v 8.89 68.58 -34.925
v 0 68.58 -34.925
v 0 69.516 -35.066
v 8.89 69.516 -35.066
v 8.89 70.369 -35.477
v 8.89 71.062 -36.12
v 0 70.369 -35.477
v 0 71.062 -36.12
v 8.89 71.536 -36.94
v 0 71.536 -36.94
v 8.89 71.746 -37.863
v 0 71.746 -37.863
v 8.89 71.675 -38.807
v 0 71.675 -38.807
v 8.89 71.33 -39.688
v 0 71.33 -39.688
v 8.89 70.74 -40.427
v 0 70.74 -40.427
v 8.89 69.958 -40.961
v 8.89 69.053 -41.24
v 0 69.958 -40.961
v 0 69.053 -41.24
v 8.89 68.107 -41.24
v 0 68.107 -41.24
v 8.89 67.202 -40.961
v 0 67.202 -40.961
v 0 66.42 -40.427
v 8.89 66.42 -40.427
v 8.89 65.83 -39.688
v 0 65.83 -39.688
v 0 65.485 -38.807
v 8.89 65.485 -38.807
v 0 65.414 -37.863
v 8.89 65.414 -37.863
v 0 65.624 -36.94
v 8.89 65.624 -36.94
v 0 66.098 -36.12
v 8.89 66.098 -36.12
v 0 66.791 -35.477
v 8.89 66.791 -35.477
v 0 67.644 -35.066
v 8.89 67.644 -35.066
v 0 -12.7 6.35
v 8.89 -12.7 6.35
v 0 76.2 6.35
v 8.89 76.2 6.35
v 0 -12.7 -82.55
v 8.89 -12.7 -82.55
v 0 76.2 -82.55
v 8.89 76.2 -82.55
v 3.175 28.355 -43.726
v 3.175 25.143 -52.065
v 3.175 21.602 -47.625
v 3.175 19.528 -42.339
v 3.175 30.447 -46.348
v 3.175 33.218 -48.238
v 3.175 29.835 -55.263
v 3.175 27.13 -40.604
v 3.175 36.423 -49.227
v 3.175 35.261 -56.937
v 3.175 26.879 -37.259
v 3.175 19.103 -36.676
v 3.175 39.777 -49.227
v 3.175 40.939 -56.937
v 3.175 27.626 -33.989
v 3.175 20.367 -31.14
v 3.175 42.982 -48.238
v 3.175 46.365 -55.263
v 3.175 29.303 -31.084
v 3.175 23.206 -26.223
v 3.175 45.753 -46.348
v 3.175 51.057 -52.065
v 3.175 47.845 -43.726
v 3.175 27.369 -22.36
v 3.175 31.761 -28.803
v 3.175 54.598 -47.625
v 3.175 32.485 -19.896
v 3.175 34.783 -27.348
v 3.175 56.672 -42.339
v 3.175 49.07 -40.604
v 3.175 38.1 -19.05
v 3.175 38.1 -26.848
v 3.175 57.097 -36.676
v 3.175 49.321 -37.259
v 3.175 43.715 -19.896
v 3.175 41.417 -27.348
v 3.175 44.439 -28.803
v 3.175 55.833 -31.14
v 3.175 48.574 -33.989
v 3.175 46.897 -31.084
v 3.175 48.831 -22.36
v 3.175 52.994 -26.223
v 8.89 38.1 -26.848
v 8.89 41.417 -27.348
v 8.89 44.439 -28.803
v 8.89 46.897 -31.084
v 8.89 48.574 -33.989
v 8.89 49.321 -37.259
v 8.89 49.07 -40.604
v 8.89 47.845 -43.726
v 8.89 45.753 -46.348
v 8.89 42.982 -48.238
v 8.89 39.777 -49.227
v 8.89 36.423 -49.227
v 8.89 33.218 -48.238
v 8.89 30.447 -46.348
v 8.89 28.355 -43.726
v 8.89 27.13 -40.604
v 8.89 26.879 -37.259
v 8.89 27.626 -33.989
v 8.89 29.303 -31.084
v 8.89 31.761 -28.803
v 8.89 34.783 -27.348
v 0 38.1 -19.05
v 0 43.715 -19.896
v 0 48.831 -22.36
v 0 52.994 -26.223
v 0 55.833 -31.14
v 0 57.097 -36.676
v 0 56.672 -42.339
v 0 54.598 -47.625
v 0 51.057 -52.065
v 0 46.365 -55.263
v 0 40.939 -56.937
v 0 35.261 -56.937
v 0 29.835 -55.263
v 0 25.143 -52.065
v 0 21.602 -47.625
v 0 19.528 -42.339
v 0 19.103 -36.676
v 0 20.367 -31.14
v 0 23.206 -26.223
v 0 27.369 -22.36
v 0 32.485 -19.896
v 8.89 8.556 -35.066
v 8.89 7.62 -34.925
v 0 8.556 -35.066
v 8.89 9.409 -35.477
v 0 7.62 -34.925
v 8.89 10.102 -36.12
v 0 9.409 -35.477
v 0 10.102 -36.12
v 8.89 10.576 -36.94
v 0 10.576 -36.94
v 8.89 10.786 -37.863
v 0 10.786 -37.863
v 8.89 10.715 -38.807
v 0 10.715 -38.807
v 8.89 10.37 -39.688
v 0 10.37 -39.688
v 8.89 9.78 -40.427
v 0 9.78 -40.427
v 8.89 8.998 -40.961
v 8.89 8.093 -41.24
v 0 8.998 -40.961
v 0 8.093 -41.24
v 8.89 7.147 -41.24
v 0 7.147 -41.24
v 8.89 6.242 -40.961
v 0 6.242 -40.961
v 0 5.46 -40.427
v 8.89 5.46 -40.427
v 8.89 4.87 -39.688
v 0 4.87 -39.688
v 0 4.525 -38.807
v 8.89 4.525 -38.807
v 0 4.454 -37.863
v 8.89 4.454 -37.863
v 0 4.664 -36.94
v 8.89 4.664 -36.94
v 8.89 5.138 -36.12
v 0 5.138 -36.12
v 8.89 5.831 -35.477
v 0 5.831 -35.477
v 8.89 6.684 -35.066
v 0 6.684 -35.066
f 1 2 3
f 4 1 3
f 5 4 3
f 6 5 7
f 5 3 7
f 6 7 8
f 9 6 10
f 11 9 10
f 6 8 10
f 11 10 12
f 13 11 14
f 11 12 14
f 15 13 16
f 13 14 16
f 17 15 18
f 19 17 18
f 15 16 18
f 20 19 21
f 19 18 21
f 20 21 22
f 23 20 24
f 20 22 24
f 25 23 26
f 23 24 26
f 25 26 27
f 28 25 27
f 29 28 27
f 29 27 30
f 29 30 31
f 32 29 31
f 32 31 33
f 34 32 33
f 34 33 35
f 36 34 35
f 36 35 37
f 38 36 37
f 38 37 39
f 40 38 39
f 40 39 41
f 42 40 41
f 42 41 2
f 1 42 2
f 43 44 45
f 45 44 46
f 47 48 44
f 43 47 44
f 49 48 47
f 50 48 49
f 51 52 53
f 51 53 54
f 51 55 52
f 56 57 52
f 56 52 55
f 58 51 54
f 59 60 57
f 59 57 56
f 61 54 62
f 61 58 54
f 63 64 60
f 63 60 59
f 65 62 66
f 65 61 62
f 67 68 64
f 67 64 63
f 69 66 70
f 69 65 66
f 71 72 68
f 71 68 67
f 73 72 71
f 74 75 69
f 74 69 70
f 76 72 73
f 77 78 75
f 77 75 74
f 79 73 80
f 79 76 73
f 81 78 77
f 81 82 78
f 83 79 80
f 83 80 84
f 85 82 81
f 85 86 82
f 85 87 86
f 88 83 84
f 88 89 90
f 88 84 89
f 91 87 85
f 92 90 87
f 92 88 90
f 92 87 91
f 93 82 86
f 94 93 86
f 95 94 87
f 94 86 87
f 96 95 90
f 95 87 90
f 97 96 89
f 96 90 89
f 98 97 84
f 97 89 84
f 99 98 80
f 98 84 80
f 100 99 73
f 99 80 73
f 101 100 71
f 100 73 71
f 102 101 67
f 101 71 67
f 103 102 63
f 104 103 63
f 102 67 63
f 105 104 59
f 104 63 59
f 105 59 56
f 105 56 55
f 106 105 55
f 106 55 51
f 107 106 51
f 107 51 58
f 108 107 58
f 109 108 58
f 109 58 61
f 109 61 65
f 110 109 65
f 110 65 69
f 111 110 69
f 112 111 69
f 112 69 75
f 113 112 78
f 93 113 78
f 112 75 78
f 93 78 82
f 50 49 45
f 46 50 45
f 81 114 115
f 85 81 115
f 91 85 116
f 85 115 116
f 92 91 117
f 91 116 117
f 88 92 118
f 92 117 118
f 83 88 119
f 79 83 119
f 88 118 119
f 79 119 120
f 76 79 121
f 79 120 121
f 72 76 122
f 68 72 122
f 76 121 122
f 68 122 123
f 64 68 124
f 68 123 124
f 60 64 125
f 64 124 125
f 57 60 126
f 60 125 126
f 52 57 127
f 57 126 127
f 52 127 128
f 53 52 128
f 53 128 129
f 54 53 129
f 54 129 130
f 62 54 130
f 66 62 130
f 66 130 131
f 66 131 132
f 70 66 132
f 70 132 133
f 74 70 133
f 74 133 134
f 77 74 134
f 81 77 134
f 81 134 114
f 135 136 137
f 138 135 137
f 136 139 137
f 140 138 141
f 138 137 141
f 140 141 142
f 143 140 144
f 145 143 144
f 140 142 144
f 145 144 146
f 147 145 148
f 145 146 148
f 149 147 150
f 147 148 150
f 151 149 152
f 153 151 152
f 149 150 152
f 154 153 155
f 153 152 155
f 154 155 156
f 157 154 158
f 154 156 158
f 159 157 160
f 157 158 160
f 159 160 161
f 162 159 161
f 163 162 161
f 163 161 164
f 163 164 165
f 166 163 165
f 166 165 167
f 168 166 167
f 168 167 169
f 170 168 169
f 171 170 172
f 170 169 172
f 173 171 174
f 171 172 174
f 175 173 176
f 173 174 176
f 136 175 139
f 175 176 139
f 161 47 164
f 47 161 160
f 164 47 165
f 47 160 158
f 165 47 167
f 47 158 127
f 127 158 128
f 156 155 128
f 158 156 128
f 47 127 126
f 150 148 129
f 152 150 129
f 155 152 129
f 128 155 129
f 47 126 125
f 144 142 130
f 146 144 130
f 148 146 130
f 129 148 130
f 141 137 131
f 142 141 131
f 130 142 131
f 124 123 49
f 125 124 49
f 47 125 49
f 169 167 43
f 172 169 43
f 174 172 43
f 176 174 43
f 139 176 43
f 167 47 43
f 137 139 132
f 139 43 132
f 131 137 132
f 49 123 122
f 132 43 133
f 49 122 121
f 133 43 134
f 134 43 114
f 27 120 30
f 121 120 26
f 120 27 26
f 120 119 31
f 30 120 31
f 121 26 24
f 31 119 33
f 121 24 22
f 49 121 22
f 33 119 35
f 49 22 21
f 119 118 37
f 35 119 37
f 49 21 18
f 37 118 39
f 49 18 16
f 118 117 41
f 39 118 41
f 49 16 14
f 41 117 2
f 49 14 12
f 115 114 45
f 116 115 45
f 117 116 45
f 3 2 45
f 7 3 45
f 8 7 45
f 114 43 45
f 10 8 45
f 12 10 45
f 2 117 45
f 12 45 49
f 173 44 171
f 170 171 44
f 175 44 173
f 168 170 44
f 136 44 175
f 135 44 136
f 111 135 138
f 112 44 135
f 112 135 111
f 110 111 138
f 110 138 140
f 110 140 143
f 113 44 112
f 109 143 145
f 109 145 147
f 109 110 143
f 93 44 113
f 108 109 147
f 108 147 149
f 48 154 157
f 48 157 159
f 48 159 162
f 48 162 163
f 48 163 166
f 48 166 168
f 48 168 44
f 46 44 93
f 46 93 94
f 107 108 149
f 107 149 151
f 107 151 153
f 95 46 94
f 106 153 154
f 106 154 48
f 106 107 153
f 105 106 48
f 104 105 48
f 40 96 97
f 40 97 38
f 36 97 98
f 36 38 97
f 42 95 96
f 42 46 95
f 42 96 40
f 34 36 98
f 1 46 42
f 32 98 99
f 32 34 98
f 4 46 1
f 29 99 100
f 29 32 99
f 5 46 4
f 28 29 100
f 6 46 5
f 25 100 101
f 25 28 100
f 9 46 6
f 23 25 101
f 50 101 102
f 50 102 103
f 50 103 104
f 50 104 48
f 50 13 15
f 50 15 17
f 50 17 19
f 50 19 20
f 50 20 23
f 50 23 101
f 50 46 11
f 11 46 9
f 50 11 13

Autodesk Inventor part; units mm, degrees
ref_plane "YZ Plane" through (0, 0, 0) normal (1, 0, 0) x (0, 1, 0)
ref_plane "XZ Plane" through (0, 0, 0) normal (0, 1, 0) x (-1, 0, 0)
ref_plane "XY Plane" through (0, 0, 0) normal (0, 0, 1) x (1, 0, 0)
sketch "Sketch3" plane through (0, 0, 0) normal (1, 0, 0) x (0, 1, 0)
  line L0 (0, 0) -> (76.2, 0)
  line L1 (76.2, 0) -> (76.2, -76.2)
  line L2 (76.2, -76.2) -> (0, -76.2)
  line L3 (0, -76.2) -> (0, 0)
  line L4 (76.2, 0) -> (50.8, 0)
  line L5 (50.8, 50.8) -> (76.2, 50.8)
  line L6 (76.2, 50.8) -> (76.2, 0)
  line L7 (76.2, -76.2) -> (50.8, -76.2)
  line L8 (50.8, -127) -> (76.2, -127)
  line L9 (76.2, -127) -> (76.2, -76.2)
  line L10 (50.8, 50.8) -> (-50.8, 50.8)
  line L11 (-50.8, 50.8) -> (-50.8, 0)
  line L12 (0, 0) -> (50.8, 0)
  line L13 (50.8, -76.2) -> (0, -76.2)
  line L14 (-50.8, -76.2) -> (-50.8, -127)
  line L15 (-50.8, -127) -> (50.8, -127)
  line L16 (0, 0) -> (0, -76.2)
  line L17 (-50.8, -76.2) -> (-50.8, 0)
  dimension "d1" = 76.2
  dimension "d26" = 50.8
extrude "Extrusion1" add sketch "Sketch3" along normal blind 25.4
sketch "Sketch5" plane through (0, 0, 0) normal (-1, 0, 0) x (0, 0, 1)
  line L0 (-76.2, 76.2) -> (0, 76.2) projected
  line L1 (-76.2, 76.2) -> (-38.1, 76.2)
  line L2 (-38.1, 76.2) -> (-38.1, 63.5)
  line L3 (-38.1, 63.5) -> (-38.1, 38.1)
  circle A0 centre (-38.1, 38.1) radius 11.2522
  point P0 (0, 0)
  dimension "d10" = 38.1
  dimension "d11" = 12.7
  dimension "d12" = 25.4
  dimension "d13" = 22.5044
extrude "Extrusion3" cut sketch "Sketch5" against normal blind 76.2
sketch "Sketch6" plane through (25.4, 0, 0) normal (1, 0, 0) x (0, 0, -1)
  circle A0 centre (38.1, 38.1) radius 11.2522 projected
  circle A1 centre (38.1, 38.1) radius 19.05
  point P0 (0, 0)
  dimension "d20" = 38.1
extrude "Extrusion4" cut sketch "Sketch6" against normal blind 6.35
sketch "Sketch8" plane through (0, 76.2, 50.8) normal (0, 1, 0) x (1, 0, 0)
  line L0 (0, 0) -> (25.4, 0) projected
  line L1 (12.7, 0) -> (9.525, 0)
  line L2 (9.525, 0) -> (15.875, 0)
  line L3 (15.875, 0) -> (15.875, 50.8)
  line L4 (15.875, 50.8) -> (9.525, 50.8)
  line L5 (9.525, 50.8) -> (9.525, 0)
  line L6 (0, 177.8) -> (0, 0) projected
  line L7 (12.7, 177.8) -> (9.525, 177.8)
  line L8 (9.525, 177.8) -> (15.875, 177.8)
  line L9 (15.875, 177.8) -> (15.875, 127)
  line L10 (15.875, 127) -> (9.525, 127)
  line L11 (9.525, 127) -> (9.525, 177.8)
  line L12 (0, 0) -> (0, 177.8)
  point P0 (0, 50.8)
  point P1 (25.4, 177.8)
  point P2 (15.875, 0)
  dimension "d28" = 6.35
  dimension "d29" = 50.8
extrude "Extrusion5" cut sketch "Sketch8" against normal blind 76.2
sketch "Sketch9" plane through (0, -50.8, 50.8) normal (0, 0, 1) x (1, 0, 0)
  line L0 (9.525, 50.8) -> (15.875, 50.8)
  line L1 (15.875, 50.8) -> (15.875, 0)
  line L2 (15.875, 0) -> (9.525, 0)
  line L3 (9.525, 0) -> (9.525, 50.8)
  point P0 (0, 50.8)
  dimension "d32" = 6.35
  dimension "d33" = 50.8
extrude "Extrusion6" cut sketch "Sketch9" against normal blind 203.2
sketch "Sketch10" plane through (0, 0, 0) normal (-1, 0, 0) x (0, 0, 1)
  circle A0 centre (-38.1, 38.1) radius 11.2522 projected
  circle A1 centre (-38.1, 38.1) radius 19.05
  point P0 (0, 0)
  dimension "d36" = 38.1
extrude "Extrusion7" cut sketch "Sketch10" against normal blind 3.175 contours A0 | A1
sketch "Sketch11" plane through (0, 76.2, 50.8) normal (0, 1, 0) x (1, 0, 0)
  line L0 (9.525, 50.8) -> (15.875, 50.8) projected
  line L1 (16.51, 50.8) -> (16.51, 0)
  line L2 (16.51, 0) -> (8.89, 0)
  line L3 (9.525, 177.8) -> (9.525, 0) projected
  line L4 (8.89, 0) -> (8.89, 51.308)
  line L5 (8.89, 0) -> (60.198, 0) construction
  line L6 (8.89, 51.308) -> (16.51, 51.308)
  line L7 (16.51, 51.308) -> (16.51, 50.8)
  line L8 (0, 69.85) -> (0, 107.95) projected
  line L9 (0, 88.9) -> (23.8125, 88.9)
  line L10 (9.525, 127) -> (15.875, 127)
  line L11 (16.51, 127) -> (16.51, 177.8)
  line L12 (16.51, 177.8) -> (8.89, 177.8)
  line L13 (8.89, 177.8) -> (8.89, 126.492)
  line L14 (8.89, 126.492) -> (16.51, 126.492)
  line L15 (16.51, 126.492) -> (16.51, 127)
  point P0 (0, 50.8)
  point P1 (0, 127)
  dimension "d40" = 7.62
extrude "Extrusion8" cut sketch "Sketch11" against normal blind 152.4
sketch "Sketch12" plane through (25.4, -50.8, 50.8) normal (0, 0, 1) x (1, 0, 0)
  line L0 (-8.89, 127) -> (-8.89, 0) projected
  line L1 (-16.51, 127) -> (-16.51, 0) projected
  line L2 (-8.89, 50.8) -> (-16.51, 50.8)
  line L3 (-16.51, 50.8) -> (-16.51, 0)
  line L4 (-16.51, 0) -> (-8.89, 0)
  line L5 (-8.89, 0) -> (-8.89, 50.8)
  point P0 (-25.4, 50.8)
extrude "Extrusion9" cut sketch "Sketch12" against normal blind 203.2
sketch "Sketch13" plane through (25.4, 0, 0) normal (1, 0, 0) x (0, 0, -1)
  line L0 (127, 76.2) -> (-50.8, 76.2) projected
  line L1 (-50.8, -50.8) -> (127, -50.8) projected
  line L2 (-50.8, 76.2) -> (-25.4, 76.2)
  line L3 (-25.4, 76.2) -> (-25.4, -50.8)
  line L4 (-25.4, -50.8) -> (-50.8, -50.8)
  line L5 (-50.8, -50.8) -> (-50.8, 76.2)
  line L6 (127, -50.8) -> (127, 76.2) projected
  line L7 (127, 76.2) -> (75.692, 76.2) projected
  line L8 (127, -50.8) -> (101.6, -50.8)
  line L9 (101.6, -50.8) -> (101.6, 76.2)
  line L10 (101.6, 76.2) -> (127, 76.2)
  line L11 (127, 76.2) -> (127, -50.8)
  point P0 (0, 0)
  dimension "d49" = 25.4
  dimension "d50" = 25.4
extrude "Extrusion10" cut sketch "Sketch13" against normal blind 25.4 contours L6 L1 L9 L0 | L3 L1 L5 L0
sketch "Sketch14" plane through (25.4, 0, 0) normal (1, 0, 0) x (0, 0, -1)
  line L0 (-25.4, -50.8) -> (101.6, -50.8) projected
  line L1 (101.6, -50.8) -> (101.6, 76.2) projected
  line L2 (-25.4, -50.8) -> (101.6, -50.8)
  line L3 (101.6, -50.8) -> (101.6, -12.7)
  line L4 (101.6, -12.7) -> (-25.4, -12.7)
  line L5 (-25.4, -12.7) -> (-25.4, -50.8)
  point P0 (0, 0)
  dimension "d53" = 38.1
extrude "Extrusion11" cut sketch "Sketch14" against normal blind 25.4
sketch "Sketch15" plane through (25.4, 0, 0) normal (1, 0, 0) x (0, 0, -1)
  point P0 (0, 0)
sketch "Sketch16" plane through (0, 76.2, 25.4) normal (0, 0, 1) x (1, 0, 0)
  point P0 (0, -76.2)
sketch "Sketch17" plane through (8.89, 76.2, -75.692) normal (0, 1, 0) x (1, 0, 0)
  line L0 (-8.89, -101.092) -> (0, -101.092) projected
  line L1 (7.62, 25.908) -> (7.62, -101.092) projected
  line L2 (0, -101.092) -> (7.62, -101.092)
  line L3 (7.62, -101.092) -> (7.62, -62.992)
  line L4 (7.62, -62.992) -> (0, -62.992)
  line L5 (0, -62.992) -> (0, -101.092)
  line L6 (7.62, 25.908) -> (7.62, 0) projected
  line L7 (0, -101.092) -> (0, 25.908) projected
  line L8 (7.62, 25.908) -> (0, 25.908)
  line L9 (0, 25.908) -> (0, -12.192)
  line L10 (0, -12.192) -> (7.62, -12.192)
  line L11 (7.62, -12.192) -> (7.62, 25.908)
  point P0 (-8.89, -75.692)
  point P1 (7.62, -12.192)
  dimension "d56" = 38.1
  dimension "d57" = 38.1
extrude "Extrusion12" cut sketch "Sketch17" against normal blind 76.2 contours L1 L10 L7 L8 | L1 L2 L5 L4
sketch "Sketch18" plane through (8.89, 0, -12.7) normal (0, -1, 0) x (1, 0, 0)
  point P0 (-8.89, 12.7)
sketch "Sketch19" plane through (25.4, 0, 0) normal (1, 0, 0) x (0, 0, -1)
  line L0 (12.7, 76.2) -> (-25.4, 76.2) projected
  line L1 (-25.4, -12.7) -> (-6.35, -12.7)
  line L2 (-6.35, -12.7) -> (-6.35, 76.2)
  line L3 (-6.35, 76.2) -> (-25.4, 76.2)
  line L4 (-25.4, 76.2) -> (-25.4, -12.7)
  line L5 (101.6, -12.7) -> (-25.4, -12.7) projected
  line L6 (101.6, 76.2) -> (-25.4, 76.2) projected
  line L7 (101.6, -12.7) -> (82.55, -12.7)
  line L8 (82.55, -12.7) -> (82.55, 76.2)
  line L9 (82.55, 76.2) -> (101.6, 76.2)
  line L10 (101.6, 76.2) -> (101.6, -12.7)
  point P0 (0, 0)
  dimension "d60" = 19.05
extrude "Extrusion13" cut sketch "Sketch19" against normal blind 76.2 contours L2 L1 L4 L0 | L6 L10 L5 L8
sketch "Sketch20" plane through (0, 76.2, 6.35) normal (0, 0, 1) x (1, 0, 0)
  line L0 (8.89, -88.9) -> (0, -88.9) projected
  line L1 (8.89, 0) -> (8.89, -76.2) projected
  line L2 (0, -88.9) -> (8.89, -88.9)
  line L3 (8.89, -88.9) -> (8.89, 0)
  line L4 (8.89, 0) -> (0, 0)
  line L5 (0, 0) -> (0, -88.9)
  line L6 (16.51, 0) -> (25.4, 0) projected
  line L7 (8.89, -88.9) -> (8.89, 0) projected
  line L8 (25.4, 0) -> (8.89, 0)
  line L9 (8.89, 0) -> (8.89, -88.9)
  line L10 (8.89, -88.9) -> (25.4, -88.9)
  line L11 (25.4, -88.9) -> (25.4, 0)
  point P0 (0, -76.2)
extrude "Extrusion14" cut sketch "Sketch20" against normal blind 127 contours L3 L1 L8 L6 L11 L10
sketch "Sketch21" plane through (0, 0, 0) normal (-1, 0, 0) x (0, 0, 1)
  circle A0 centre (-38.1, 38.1) radius 11.2522 projected
  circle A1 centre (-38.1, 68.58) radius 3.175
  circle A2 centre (-38.1, 7.62) radius 3.175
  point P0 (0, 0)
  dimension "d67" = 6.35
  dimension "d68" = 6.35
extrude "Extrusion15" cut sketch "Sketch21" against normal blind 25.4 contours A1 | A2
properties part number "220307 Rod Supports correct"
